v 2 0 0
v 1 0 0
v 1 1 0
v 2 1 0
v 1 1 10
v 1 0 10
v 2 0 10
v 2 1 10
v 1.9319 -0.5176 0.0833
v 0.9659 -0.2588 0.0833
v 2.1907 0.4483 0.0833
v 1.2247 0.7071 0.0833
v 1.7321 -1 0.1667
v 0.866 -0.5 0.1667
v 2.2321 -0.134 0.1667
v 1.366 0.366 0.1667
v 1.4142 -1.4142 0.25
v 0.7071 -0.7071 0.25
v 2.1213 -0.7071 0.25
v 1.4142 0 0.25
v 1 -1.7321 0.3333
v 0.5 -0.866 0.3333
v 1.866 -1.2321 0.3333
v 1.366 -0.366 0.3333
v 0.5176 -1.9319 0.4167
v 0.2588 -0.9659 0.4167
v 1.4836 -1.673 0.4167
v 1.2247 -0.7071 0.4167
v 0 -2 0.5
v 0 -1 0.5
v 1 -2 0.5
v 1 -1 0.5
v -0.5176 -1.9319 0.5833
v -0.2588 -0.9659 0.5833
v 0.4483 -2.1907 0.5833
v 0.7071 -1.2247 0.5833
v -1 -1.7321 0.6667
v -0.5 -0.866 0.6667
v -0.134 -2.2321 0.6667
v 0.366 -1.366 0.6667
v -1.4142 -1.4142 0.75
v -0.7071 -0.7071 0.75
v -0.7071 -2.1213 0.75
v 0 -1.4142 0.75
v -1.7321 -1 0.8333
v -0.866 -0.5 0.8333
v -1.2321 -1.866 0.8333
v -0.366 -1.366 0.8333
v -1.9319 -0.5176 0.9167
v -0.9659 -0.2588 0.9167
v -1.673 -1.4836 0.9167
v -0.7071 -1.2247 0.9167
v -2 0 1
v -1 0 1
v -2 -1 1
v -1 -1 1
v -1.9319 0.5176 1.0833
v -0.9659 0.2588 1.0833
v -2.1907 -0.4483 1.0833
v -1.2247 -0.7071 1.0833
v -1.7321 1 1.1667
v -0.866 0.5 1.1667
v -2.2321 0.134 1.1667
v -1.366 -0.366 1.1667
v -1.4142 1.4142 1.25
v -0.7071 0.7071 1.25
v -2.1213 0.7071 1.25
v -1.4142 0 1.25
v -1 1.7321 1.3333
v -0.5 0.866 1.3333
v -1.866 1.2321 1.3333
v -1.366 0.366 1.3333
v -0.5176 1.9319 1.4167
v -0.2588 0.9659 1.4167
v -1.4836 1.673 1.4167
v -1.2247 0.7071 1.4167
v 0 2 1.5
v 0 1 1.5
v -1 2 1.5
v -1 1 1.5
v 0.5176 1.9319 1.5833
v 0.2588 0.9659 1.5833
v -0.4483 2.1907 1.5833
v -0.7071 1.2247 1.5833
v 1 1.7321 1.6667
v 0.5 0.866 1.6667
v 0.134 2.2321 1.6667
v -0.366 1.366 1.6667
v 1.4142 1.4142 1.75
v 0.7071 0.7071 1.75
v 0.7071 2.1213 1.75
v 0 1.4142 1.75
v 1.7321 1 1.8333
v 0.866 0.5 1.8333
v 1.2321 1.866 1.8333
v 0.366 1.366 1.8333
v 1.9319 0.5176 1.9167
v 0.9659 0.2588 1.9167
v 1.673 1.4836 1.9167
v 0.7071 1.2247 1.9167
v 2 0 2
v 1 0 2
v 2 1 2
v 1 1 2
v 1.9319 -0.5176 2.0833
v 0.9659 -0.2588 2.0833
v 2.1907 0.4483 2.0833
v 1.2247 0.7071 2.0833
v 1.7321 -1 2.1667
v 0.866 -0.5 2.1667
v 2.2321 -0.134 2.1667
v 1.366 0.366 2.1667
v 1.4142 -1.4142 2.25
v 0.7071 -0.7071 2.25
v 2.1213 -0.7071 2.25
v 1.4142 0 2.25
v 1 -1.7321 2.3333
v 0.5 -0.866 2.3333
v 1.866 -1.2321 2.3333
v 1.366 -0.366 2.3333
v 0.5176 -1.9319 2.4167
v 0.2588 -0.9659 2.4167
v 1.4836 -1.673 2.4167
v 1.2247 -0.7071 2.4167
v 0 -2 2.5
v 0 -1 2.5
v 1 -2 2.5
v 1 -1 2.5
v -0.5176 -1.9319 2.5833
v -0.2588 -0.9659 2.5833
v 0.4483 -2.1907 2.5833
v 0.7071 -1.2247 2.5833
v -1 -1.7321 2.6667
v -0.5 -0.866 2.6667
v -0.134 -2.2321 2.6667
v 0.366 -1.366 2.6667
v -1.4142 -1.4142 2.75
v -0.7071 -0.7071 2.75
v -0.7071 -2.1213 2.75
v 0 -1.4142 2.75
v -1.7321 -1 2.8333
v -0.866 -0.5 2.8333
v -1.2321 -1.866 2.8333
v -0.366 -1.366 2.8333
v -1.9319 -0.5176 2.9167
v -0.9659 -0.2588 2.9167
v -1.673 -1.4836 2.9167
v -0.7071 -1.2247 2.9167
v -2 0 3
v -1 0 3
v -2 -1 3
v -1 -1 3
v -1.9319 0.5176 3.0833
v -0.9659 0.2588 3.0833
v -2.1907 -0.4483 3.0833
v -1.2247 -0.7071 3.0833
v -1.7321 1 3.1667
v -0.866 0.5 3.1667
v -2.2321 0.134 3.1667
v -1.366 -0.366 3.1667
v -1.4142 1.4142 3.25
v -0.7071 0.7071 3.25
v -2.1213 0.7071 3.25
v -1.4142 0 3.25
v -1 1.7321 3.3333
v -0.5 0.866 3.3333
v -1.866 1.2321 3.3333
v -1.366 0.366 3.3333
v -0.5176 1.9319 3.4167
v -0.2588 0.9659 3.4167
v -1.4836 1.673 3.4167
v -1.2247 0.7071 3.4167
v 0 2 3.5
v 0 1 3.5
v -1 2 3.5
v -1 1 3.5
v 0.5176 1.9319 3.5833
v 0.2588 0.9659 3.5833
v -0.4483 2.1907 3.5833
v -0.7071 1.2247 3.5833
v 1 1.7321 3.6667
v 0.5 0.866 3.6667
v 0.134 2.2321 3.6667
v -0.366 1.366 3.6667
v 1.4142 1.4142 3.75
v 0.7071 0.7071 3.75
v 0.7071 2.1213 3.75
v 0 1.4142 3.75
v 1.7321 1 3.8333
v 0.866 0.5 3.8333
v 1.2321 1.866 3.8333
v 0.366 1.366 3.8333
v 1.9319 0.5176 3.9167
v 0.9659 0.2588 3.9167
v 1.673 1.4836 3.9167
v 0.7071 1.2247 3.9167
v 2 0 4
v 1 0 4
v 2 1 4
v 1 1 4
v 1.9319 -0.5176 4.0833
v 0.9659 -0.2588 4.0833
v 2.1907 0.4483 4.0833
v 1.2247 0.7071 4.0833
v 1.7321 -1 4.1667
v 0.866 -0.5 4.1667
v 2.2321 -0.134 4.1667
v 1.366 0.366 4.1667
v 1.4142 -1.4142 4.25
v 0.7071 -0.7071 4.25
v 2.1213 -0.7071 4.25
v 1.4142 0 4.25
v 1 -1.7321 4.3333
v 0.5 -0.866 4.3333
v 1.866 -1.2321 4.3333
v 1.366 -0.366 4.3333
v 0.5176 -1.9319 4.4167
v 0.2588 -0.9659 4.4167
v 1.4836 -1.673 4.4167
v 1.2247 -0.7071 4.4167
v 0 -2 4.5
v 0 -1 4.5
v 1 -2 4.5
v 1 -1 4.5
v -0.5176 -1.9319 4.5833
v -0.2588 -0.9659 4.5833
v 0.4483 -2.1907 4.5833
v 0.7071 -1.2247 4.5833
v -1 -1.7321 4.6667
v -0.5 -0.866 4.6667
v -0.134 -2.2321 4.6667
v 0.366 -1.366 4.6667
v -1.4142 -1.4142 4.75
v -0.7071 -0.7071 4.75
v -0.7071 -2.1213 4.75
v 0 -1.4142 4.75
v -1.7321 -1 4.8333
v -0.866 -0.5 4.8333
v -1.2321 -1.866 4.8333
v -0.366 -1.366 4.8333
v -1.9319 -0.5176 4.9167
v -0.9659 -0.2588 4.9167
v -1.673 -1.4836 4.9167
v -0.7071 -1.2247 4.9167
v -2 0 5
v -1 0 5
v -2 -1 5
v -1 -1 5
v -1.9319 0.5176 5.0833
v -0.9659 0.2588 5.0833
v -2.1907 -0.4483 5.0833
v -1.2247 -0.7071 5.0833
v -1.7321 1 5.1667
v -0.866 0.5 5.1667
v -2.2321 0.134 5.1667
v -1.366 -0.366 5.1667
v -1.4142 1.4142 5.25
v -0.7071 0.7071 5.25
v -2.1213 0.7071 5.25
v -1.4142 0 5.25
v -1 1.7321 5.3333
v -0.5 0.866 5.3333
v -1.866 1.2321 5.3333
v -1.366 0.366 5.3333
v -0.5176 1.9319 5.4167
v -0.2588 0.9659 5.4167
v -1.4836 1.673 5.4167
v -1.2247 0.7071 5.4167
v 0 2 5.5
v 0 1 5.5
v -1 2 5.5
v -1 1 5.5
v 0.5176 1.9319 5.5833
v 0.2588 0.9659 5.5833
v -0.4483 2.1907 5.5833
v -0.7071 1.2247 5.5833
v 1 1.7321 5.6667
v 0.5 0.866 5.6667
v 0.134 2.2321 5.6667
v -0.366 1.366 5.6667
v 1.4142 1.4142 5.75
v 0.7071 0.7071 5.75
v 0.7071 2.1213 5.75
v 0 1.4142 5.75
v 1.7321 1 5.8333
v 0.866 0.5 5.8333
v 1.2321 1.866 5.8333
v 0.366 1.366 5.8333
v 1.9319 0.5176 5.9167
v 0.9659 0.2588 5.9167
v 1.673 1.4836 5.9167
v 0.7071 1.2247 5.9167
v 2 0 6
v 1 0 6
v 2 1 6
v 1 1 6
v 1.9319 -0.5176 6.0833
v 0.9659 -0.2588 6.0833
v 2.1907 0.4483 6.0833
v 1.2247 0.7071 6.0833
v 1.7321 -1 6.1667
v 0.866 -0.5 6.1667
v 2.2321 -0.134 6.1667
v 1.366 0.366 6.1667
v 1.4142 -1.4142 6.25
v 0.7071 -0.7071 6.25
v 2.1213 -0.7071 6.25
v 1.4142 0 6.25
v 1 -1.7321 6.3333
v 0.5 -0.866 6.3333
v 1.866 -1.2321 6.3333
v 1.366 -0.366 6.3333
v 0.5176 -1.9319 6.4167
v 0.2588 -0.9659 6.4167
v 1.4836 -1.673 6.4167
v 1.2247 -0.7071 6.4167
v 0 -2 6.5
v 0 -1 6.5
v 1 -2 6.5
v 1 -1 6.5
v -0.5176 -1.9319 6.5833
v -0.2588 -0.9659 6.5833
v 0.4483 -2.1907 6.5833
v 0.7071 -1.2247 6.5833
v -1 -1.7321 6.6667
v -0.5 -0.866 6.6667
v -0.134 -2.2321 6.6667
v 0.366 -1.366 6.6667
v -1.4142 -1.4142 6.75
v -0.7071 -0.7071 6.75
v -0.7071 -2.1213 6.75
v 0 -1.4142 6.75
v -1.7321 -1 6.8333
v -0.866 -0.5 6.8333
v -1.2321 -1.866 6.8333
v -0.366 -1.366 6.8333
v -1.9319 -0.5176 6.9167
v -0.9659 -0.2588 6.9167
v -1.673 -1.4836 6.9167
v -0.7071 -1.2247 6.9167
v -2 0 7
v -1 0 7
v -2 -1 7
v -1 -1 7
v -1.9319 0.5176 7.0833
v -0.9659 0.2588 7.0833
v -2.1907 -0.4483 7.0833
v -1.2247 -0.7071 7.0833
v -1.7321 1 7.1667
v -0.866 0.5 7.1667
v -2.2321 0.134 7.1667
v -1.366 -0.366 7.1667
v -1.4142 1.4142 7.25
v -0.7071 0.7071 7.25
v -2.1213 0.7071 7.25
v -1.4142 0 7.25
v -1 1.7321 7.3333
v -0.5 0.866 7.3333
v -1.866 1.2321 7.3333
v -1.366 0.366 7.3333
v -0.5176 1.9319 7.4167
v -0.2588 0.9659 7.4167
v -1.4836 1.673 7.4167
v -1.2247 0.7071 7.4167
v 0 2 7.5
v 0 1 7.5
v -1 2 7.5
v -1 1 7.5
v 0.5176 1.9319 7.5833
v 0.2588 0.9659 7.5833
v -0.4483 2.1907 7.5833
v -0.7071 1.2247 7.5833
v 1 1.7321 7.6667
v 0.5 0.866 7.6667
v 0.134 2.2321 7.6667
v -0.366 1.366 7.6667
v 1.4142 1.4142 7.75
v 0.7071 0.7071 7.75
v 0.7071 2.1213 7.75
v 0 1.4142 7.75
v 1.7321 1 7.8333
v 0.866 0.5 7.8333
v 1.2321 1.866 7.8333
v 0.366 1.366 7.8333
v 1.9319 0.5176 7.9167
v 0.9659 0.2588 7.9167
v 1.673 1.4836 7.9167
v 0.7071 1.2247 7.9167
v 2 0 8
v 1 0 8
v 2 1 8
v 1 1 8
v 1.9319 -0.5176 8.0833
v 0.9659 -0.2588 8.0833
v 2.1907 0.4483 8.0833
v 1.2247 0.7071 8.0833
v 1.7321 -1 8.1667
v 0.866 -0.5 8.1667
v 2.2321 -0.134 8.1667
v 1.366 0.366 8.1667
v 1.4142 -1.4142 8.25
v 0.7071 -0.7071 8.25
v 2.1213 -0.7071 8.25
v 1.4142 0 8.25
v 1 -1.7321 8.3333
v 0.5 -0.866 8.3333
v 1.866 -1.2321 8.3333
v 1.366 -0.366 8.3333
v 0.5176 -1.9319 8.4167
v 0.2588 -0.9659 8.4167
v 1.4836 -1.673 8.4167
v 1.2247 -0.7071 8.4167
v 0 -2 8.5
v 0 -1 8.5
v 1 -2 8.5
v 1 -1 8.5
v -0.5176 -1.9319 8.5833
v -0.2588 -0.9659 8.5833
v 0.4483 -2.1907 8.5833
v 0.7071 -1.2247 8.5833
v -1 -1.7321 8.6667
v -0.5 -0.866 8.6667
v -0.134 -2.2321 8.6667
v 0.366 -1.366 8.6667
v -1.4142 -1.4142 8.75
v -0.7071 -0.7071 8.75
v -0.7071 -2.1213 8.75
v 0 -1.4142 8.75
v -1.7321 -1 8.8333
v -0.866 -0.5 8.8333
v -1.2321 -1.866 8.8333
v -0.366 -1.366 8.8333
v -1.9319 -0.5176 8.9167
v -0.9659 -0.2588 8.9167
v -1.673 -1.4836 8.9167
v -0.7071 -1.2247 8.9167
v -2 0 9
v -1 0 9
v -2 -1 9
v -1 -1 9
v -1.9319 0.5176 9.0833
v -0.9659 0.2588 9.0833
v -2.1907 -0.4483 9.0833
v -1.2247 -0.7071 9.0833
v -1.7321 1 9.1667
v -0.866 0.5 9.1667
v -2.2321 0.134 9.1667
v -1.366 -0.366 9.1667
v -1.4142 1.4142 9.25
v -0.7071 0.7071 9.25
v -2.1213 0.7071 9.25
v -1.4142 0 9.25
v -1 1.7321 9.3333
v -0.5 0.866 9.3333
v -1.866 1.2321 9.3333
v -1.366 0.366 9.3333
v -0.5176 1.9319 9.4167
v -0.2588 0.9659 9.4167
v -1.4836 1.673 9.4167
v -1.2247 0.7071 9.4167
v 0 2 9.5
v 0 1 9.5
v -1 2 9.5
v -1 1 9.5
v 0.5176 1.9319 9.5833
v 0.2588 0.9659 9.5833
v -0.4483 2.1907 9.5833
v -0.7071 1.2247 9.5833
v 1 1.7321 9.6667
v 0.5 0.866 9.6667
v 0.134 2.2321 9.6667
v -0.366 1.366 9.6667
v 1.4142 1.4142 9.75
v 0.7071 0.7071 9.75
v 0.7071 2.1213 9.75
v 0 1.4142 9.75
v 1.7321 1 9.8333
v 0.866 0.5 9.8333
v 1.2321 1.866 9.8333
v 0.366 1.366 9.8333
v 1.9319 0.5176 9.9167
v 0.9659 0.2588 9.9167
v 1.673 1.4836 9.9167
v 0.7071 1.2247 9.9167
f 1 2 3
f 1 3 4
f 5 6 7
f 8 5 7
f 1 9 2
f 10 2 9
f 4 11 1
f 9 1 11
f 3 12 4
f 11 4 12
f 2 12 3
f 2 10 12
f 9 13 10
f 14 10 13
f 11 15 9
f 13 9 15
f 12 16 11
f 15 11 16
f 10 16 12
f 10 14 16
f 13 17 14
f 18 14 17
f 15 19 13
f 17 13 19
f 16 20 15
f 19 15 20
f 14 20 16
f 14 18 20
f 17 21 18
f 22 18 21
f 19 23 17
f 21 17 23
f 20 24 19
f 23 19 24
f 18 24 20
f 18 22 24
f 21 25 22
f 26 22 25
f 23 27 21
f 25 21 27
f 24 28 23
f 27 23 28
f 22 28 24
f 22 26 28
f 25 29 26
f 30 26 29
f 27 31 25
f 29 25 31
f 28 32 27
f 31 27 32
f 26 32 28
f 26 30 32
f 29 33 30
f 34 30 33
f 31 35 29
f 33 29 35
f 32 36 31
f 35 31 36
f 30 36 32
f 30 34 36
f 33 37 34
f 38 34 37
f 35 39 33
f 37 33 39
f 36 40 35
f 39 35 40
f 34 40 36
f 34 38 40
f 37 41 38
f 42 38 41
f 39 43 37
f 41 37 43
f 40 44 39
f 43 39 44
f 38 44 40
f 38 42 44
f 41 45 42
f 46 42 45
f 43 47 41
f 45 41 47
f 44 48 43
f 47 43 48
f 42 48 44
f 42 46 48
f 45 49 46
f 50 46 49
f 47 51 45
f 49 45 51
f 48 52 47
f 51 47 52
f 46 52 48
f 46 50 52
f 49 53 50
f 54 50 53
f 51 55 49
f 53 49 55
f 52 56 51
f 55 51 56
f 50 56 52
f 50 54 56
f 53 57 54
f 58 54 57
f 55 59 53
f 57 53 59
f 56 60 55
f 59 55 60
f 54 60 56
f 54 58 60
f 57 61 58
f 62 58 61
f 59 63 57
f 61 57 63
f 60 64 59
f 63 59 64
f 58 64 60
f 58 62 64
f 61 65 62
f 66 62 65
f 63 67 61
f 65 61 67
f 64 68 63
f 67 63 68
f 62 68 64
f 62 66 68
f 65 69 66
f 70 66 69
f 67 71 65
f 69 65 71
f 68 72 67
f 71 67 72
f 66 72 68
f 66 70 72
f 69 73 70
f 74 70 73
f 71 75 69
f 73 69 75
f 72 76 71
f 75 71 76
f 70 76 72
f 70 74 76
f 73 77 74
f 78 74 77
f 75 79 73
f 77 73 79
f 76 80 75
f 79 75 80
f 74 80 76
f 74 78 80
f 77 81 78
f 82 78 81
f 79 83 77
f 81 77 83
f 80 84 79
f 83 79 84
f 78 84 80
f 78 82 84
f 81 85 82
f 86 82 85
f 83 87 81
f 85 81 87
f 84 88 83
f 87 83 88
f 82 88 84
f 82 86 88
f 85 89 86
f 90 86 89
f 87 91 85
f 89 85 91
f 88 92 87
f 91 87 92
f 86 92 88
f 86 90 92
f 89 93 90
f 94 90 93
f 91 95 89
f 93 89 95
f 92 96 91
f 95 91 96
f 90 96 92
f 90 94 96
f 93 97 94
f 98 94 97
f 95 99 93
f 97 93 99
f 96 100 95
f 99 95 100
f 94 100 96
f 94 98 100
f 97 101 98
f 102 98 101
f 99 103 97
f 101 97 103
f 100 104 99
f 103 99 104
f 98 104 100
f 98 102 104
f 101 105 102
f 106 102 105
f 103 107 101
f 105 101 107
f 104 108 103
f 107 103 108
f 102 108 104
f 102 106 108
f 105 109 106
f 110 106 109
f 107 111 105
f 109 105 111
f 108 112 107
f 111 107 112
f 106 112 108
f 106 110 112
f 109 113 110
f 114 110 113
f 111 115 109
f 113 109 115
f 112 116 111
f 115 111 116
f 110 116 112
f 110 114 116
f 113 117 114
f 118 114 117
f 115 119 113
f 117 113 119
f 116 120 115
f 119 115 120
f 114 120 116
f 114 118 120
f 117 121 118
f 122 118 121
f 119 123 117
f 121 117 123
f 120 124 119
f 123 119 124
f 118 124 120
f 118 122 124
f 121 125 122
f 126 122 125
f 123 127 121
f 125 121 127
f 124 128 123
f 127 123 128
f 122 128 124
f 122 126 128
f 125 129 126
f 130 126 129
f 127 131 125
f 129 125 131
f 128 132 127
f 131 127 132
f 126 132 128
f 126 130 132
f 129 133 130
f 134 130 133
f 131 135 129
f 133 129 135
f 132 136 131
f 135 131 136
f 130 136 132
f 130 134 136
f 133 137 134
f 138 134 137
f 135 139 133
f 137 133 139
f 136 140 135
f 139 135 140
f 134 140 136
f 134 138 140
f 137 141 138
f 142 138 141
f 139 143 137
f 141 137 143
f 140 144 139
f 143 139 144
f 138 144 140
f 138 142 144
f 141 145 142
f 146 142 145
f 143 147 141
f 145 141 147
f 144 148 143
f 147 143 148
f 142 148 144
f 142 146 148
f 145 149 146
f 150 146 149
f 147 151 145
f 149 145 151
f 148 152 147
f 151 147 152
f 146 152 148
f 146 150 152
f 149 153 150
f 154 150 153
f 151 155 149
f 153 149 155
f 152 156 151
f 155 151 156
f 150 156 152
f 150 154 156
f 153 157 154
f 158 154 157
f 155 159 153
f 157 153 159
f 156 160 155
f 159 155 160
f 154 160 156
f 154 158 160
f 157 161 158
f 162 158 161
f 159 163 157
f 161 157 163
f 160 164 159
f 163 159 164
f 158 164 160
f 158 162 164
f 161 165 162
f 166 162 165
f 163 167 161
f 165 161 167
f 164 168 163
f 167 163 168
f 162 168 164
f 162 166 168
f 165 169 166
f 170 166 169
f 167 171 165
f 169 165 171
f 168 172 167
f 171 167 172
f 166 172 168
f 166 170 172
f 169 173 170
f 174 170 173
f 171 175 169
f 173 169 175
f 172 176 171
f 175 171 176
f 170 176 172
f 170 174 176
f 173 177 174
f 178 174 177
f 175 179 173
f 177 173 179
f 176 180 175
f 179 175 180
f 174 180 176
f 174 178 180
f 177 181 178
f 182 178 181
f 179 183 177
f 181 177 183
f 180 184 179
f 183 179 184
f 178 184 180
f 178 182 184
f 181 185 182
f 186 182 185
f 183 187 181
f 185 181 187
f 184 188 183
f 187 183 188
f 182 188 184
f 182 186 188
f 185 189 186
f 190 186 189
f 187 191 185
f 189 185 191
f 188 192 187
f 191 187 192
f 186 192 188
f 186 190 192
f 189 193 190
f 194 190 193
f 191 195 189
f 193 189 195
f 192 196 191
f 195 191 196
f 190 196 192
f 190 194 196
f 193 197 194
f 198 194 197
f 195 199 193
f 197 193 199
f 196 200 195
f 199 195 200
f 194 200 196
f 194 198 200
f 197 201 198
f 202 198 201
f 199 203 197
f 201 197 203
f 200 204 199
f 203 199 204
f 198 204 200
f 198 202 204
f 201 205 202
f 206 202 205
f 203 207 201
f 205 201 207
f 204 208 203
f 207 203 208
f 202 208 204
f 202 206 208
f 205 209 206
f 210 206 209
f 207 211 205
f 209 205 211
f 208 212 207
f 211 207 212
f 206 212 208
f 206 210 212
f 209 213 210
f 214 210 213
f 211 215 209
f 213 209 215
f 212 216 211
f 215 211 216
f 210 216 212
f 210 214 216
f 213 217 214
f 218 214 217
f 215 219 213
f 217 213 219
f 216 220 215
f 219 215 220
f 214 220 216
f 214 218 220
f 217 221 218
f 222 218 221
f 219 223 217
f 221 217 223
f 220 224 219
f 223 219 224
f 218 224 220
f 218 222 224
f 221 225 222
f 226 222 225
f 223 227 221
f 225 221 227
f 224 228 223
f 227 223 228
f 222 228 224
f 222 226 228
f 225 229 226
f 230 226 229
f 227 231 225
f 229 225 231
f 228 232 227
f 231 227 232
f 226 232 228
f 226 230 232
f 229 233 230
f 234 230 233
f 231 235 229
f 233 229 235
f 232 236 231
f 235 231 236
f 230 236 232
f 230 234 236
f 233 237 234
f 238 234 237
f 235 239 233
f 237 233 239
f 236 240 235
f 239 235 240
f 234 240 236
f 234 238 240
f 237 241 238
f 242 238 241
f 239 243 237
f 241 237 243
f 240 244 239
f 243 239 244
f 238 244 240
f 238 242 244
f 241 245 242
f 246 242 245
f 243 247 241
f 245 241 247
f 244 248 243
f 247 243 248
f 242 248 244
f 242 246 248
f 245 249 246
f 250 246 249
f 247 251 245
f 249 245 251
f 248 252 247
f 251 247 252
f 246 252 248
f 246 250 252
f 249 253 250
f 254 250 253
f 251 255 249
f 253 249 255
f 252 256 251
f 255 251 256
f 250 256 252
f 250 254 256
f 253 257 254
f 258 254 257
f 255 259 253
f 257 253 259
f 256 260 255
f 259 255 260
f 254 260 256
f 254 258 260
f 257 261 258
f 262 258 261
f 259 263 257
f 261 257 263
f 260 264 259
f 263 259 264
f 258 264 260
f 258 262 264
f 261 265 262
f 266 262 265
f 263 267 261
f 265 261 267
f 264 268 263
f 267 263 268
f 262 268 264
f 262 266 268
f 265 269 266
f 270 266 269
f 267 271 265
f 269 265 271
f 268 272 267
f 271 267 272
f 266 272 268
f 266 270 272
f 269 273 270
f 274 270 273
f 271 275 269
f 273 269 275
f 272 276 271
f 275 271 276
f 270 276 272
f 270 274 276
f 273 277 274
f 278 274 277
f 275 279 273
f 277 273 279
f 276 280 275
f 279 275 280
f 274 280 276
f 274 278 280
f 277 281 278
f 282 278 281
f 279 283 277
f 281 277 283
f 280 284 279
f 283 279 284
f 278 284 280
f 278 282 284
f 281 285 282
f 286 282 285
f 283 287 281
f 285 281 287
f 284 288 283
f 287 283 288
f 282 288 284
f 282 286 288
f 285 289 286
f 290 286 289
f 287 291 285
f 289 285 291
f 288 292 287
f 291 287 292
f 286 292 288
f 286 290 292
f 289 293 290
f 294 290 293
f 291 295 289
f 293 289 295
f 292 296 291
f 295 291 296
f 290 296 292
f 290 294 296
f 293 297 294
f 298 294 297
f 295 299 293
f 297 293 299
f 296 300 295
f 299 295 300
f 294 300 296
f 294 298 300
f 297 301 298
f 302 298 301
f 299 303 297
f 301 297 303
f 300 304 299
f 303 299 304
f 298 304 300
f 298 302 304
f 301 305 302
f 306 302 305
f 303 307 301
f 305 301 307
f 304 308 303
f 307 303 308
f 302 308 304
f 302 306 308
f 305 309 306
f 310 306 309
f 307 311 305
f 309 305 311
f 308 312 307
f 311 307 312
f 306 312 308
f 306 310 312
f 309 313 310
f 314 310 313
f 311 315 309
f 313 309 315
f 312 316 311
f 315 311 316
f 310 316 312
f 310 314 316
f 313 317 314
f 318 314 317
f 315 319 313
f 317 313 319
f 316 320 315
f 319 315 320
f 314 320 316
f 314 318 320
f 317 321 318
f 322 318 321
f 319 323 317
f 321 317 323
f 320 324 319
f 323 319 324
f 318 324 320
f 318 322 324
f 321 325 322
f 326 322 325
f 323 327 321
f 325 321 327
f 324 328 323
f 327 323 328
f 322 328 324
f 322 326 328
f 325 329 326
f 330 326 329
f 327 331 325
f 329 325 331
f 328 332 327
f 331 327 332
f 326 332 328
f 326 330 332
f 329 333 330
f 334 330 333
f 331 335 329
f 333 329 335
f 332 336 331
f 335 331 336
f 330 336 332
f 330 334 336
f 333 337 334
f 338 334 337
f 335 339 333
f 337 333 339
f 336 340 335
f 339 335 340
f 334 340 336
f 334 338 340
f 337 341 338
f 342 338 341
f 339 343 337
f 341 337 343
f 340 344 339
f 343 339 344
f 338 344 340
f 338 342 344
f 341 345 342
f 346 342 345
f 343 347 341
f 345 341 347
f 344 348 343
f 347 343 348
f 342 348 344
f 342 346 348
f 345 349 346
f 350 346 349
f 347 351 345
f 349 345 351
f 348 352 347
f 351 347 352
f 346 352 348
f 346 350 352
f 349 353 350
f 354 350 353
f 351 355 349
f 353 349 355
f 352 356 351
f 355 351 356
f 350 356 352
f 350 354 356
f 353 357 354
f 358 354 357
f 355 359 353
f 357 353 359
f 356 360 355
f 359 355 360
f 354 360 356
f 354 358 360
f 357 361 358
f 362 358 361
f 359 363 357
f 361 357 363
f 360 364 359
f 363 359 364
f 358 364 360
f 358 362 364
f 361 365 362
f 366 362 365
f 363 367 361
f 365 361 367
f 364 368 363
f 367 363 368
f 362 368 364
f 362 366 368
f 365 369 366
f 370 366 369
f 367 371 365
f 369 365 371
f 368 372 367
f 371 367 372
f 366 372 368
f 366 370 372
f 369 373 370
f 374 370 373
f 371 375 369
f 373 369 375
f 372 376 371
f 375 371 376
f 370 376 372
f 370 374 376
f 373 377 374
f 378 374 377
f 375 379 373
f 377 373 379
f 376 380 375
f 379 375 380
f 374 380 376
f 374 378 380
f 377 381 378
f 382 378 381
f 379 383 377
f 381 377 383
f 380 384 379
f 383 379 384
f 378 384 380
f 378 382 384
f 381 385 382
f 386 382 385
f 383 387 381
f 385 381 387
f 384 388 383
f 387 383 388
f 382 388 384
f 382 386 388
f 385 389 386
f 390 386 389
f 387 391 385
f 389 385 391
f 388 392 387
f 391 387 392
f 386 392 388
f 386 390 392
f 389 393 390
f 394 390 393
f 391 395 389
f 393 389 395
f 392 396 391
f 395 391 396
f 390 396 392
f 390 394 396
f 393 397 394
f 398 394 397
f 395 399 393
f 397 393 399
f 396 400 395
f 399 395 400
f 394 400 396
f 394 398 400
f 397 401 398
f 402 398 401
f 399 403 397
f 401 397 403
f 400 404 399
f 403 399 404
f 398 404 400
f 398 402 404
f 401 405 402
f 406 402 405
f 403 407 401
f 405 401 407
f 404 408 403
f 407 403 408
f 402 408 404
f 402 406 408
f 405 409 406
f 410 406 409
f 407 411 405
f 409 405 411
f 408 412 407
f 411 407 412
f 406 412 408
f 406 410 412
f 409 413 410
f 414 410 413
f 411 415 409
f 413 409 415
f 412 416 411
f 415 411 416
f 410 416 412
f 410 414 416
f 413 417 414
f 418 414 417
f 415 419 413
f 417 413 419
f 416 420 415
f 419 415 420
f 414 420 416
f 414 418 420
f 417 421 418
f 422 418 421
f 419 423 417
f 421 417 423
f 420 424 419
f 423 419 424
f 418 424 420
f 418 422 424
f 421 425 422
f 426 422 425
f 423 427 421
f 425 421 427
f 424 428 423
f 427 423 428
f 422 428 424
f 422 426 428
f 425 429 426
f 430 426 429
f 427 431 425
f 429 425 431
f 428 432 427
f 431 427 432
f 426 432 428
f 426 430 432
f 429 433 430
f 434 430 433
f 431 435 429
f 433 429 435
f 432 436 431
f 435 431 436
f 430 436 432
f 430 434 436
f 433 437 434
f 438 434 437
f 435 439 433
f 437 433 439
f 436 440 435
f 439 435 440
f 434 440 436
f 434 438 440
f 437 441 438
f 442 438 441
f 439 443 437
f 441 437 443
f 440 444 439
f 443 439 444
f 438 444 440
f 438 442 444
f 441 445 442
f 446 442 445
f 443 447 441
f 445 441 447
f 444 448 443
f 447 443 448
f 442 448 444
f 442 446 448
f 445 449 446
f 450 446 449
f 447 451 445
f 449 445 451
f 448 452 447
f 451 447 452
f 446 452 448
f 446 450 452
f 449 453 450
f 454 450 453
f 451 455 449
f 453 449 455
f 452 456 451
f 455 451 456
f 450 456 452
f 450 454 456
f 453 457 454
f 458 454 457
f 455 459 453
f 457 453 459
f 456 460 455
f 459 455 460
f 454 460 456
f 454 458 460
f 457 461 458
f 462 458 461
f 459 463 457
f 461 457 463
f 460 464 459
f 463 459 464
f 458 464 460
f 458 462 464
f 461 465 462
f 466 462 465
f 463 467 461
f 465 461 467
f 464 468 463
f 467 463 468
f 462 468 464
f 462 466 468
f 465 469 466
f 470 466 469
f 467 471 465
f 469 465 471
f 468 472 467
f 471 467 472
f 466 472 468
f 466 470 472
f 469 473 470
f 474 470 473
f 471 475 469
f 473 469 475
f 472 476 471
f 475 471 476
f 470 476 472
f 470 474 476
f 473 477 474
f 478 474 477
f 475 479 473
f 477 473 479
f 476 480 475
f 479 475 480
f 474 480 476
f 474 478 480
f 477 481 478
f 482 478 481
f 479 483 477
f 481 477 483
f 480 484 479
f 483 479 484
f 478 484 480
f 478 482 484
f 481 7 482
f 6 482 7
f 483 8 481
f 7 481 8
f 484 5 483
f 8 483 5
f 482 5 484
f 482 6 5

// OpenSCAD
//------------------------------------------------------------------------------------------
// THIS CODE WAS GENERATED WITH GRAPHSCAD
//------------------------------------------------------------------------------------------
// Graphscad is a graphical nodal editor to create .SCAD files
//
// More info : http://graphscad.free.fr
//
// Scad Files created with Graphscad can be edited by graphscad
// Scad Files created with Graphscad can be read by Openscad
//
//------------------------------------------------------------------------------------------
module linearextrude()
{
 function node_square_matrix(i=0,j=0,k=0,l=0,m=0,n=0) = translate([1,0,0]);
 module node_square(i=0,j=0,k=0,l=0,m=0,n=0)
 {
  translate([1,0,0])square(size=[1,1],center=false);
 }
 function node_linearextrude_matrix(i=0,j=0,k=0,l=0,m=0,n=0) = translate([0,0,0]);
 module node_linearextrude(i=0,j=0,k=0,l=0,m=0,n=0)
 {
  linear_extrude(height=10,center=false,convexity=1,twist=360*5,slices=120,scale=1)
  {
   node_square(i,j,k,l,m,n);
  }
 }
 node_linearextrude();
 /*--------------------------------------------------------------------------------------------------------
  Graphscad Utils functions
  This code is Used By Graphscad Nodal Editor to generate SCAD files
 --------------------------------------------------------------------------------------------------------*/
 function det4x4(a) =
 a[0][0]*a[1][1]*a[2][2]*a[3][3] + a[0][0]*a[1][2]*a[2][3]*a[3][1] + a[0][0]*a[1][3]*a[2][1]*a[3][2]
 + a[0][1]*a[1][0]*a[2][3]*a[3][2] + a[0][1]*a[1][2]*a[2][0]*a[3][3] + a[0][1]*a[1][3]*a[2][2]*a[3][0]
 + a[0][2]*a[1][0]*a[2][1]*a[3][3] + a[0][2]*a[1][1]*a[2][3]*a[3][0] + a[0][2]*a[1][3]*a[2][0]*a[3][1]
 + a[0][3]*a[1][0]*a[2][2]*a[3][1] + a[0][3]*a[1][1]*a[2][0]*a[3][2] + a[0][3]*a[1][2]*a[2][1]*a[3][0]
 - a[0][0]*a[1][1]*a[2][3]*a[3][2] - a[0][0]*a[1][2]*a[2][1]*a[3][3] - a[0][0]*a[1][3]*a[2][2]*a[3][1]
 - a[0][1]*a[1][0]*a[2][2]*a[3][3] - a[0][1]*a[1][2]*a[2][3]*a[3][0] - a[0][1]*a[1][3]*a[2][0]*a[3][2]
 - a[0][2]*a[1][0]*a[2][3]*a[3][1] - a[0][2]*a[1][1]*a[2][0]*a[3][3] - a[0][2]*a[1][3]*a[2][1]*a[3][0]
 - a[0][3]*a[1][0]*a[2][1]*a[3][2] - a[0][3]*a[1][1]*a[2][2]*a[3][0] - a[0][3]*a[1][2]*a[2][0]*a[3][1];
 function invb00(a) = a[1][1]*a[2][2]*a[3][3] + a[1][2]*a[2][3]*a[3][1] + a[1][3]*a[2][1]*a[3][2] - a[1][1]*a[2][3]*a[3][2] - a[1][2]*a[2][1]*a[3][3] - a[1][3]*a[2][2]*a[3][1];
 function invb01(a) = a[0][1]*a[2][3]*a[3][2] + a[0][2]*a[2][1]*a[3][3] + a[0][3]*a[2][2]*a[3][1] - a[0][1]*a[2][2]*a[3][3] - a[0][2]*a[2][3]*a[3][1] - a[0][3]*a[2][1]*a[3][2];
 function invb02(a) = a[0][1]*a[1][2]*a[3][3] + a[0][2]*a[1][3]*a[3][1] + a[0][3]*a[1][1]*a[3][2] - a[0][1]*a[1][3]*a[3][2] - a[0][2]*a[1][1]*a[3][3] - a[0][3]*a[1][2]*a[3][1];
 function invb03(a) = a[0][1]*a[1][3]*a[2][2] + a[0][2]*a[1][1]*a[2][3] + a[0][3]*a[1][2]*a[2][1] - a[0][1]*a[1][2]*a[2][3] - a[0][2]*a[1][3]*a[2][1] - a[0][3]*a[1][1]*a[2][2];
 function invb10(a) = a[1][0]*a[2][3]*a[3][2] + a[1][2]*a[2][0]*a[3][3] + a[1][3]*a[2][2]*a[3][0] - a[1][0]*a[2][2]*a[3][3] - a[1][2]*a[2][3]*a[3][0] - a[1][3]*a[2][0]*a[3][2];
 function invb11(a) = a[0][0]*a[2][2]*a[3][3] + a[0][2]*a[2][3]*a[3][0] + a[0][3]*a[2][0]*a[3][2] - a[0][0]*a[2][3]*a[3][2] - a[0][2]*a[2][0]*a[3][3] - a[0][3]*a[2][2]*a[3][0];
 function invb12(a) = a[0][0]*a[1][3]*a[3][2] + a[0][2]*a[1][0]*a[3][3] + a[0][3]*a[1][2]*a[3][0] - a[0][0]*a[1][2]*a[3][3] - a[0][2]*a[1][3]*a[3][0] - a[0][3]*a[1][0]*a[3][2];
 function invb13(a) = a[0][0]*a[1][2]*a[2][3] + a[0][2]*a[1][3]*a[2][0] + a[0][3]*a[1][0]*a[2][2] - a[0][0]*a[1][3]*a[2][2] - a[0][2]*a[1][0]*a[2][3] - a[0][3]*a[1][2]*a[2][0];
 function invb20(a) = a[1][0]*a[2][1]*a[3][3] + a[1][1]*a[2][3]*a[3][0] + a[1][3]*a[2][0]*a[3][1] - a[1][0]*a[2][3]*a[3][1] - a[1][1]*a[2][0]*a[3][3] - a[1][3]*a[2][1]*a[3][0];
 function invb21(a) = a[0][0]*a[2][3]*a[3][1] + a[0][1]*a[2][0]*a[3][3] + a[0][3]*a[2][1]*a[3][0] - a[0][0]*a[2][1]*a[3][3] - a[0][1]*a[2][3]*a[3][0] - a[0][3]*a[2][0]*a[3][1];
 function invb22(a) = a[0][0]*a[1][1]*a[3][3] + a[0][1]*a[1][3]*a[3][0] + a[0][3]*a[1][0]*a[3][1] - a[0][0]*a[1][3]*a[3][1] - a[0][1]*a[1][0]*a[3][3] - a[0][3]*a[1][1]*a[3][0];
 function invb23(a) = a[0][0]*a[1][3]*a[2][1] + a[0][1]*a[1][0]*a[2][3] + a[0][3]*a[1][1]*a[2][0] - a[0][0]*a[1][1]*a[2][3] - a[0][1]*a[1][3]*a[2][0] - a[0][3]*a[1][0]*a[2][1];
 function invb30(a) = a[1][0]*a[2][2]*a[3][1] + a[1][1]*a[2][0]*a[3][2] + a[1][2]*a[2][1]*a[3][0] - a[1][0]*a[2][1]*a[3][2] - a[1][1]*a[2][2]*a[3][0] - a[1][2]*a[2][0]*a[3][1];
 function invb31(a) = a[0][0]*a[2][1]*a[3][2] + a[0][1]*a[2][2]*a[3][0] + a[0][2]*a[2][0]*a[3][1] - a[0][0]*a[2][2]*a[3][1] - a[0][1]*a[2][0]*a[3][2] - a[0][2]*a[2][1]*a[3][0];
 function invb32(a) = a[0][0]*a[1][2]*a[3][1] + a[0][1]*a[1][0]*a[3][2] + a[0][2]*a[1][1]*a[3][0] - a[0][0]*a[1][1]*a[3][2] - a[0][1]*a[1][2]*a[3][0] - a[0][2]*a[1][0]*a[3][1];
 function invb33(a) = a[0][0]*a[1][1]*a[2][2] + a[0][1]*a[1][2]*a[2][0] + a[0][2]*a[1][0]*a[2][1] - a[0][0]*a[1][2]*a[2][1] - a[0][1]*a[1][0]*a[2][2] - a[0][2]*a[1][1]*a[2][0];
 function inv4x4(a)= (1/det4x4(a))*[
 [invb00(a),invb01(a),invb02(a),invb03(a)],
 [invb10(a),invb11(a),invb12(a),invb13(a)],
 [invb20(a),invb21(a),invb22(a),invb23(a)],
 [invb30(a),invb31(a),invb32(a),invb33(a)]];
 function onlytranslate(a)=  [
                        [1,0,0,a[0][3]],
                        [0,1,0,a[1][3]],
                        [0,0,1,a[2][3]],
                        [0,0,0,1]];
 function negonlytranslate(a)=[
                        [1,0,0,-a[0][3]],
                        [0,1,0,-a[1][3]],
                        [0,0,1,-a[2][3]],
                        [0,0,0,1]];
 function lookatvec(t,parentmat) = [t[0]-parentmat[0][3],
                                 t[1]-parentmat[1][3],
                                 t[2]-parentmat[2][3]];
 /*
              rx = '0'
              ry = 'acos('+tz+'/norm(['+tx+','+ty+','+tz+']))'
              rz = 'atan2('+ty+','+tx+')'
 */
 function lookatrot(t,parentmat) = [0,
                                 acos((t[2]-parentmat[2][3])/norm(lookatvec(t,parentmat))),
                                 atan2(t[1]-parentmat[1][3],t[0]-parentmat[0][3])];
 function gettranslation(m) = [m[0][3],m[1][3],m[2][3]];
 function vectormulmatrix(v,m) = m*v;
 function vectorlength(v) = norm(v);
 function vectorx(v) = v[0];
 function vectory(v) = v[1];
 function vectorz(v) = v[2];
 function vectoradd(a,b) = (a+b);
 function vectorsub(a,b) = (a-b);
 function vectormul(a,b) = (a*b);
 function vectordiv(a,b) = (a*(1/b));
 function scale(v)=[[v[0],0,0,0],
                    [0,v[1],0,0],
                    [0,0,v[2],0],
                    [0,0,0,1]];
 function rotatex(a)=[[1,0,0,0],
                      [0,cos(a),-sin(a),0],
                      [0,sin(a),cos(a),0],
                      [0,0,0,1]];
 function rotatey(a)=[[cos(a),0,sin(a),0],
                      [0,1,0,0],
                      [-sin(a),0,cos(a),0],
                      [0,0,0,1]];
 function rotatez(a)=[[cos(a),-sin(a),0,0],
                      [sin(a),cos(a),0,0],
                      [0,0,1,0],
                      [0,0,0,1]];
 function rotatea(c,s,l,m,n)=[[l*l*(1-c)+c,m*l*(1-c)-n*s,n*l*(1-c)+m*s,0],
                              [l*m*(1-c)+n*s,m*m*(1-c)+c,n*m*(1-c)-l*s,0],
                              [l*n*(1-c)-m*s,m*n*(1-c)+l*s,n*n*(1-c)+c,0],
                              [0,0,0,1]];
 function rotateanv(a,nv)=rotatea(cos(a),sin(a),nv[0],nv[1],nv[2]);
 function rotate(a,v, normV=true)=(v==undef)?rotatez(a[2])*rotatey(a[1])*rotatex(a[0]):
                      normV ? rotateanv(a,v/sqrt(v*v)) : rotateanv(a,v);
 function translate(v)=[[1,0,0,v[0]],
                        [0,1,0,v[1]],
                        [0,0,1,v[2]],
                        [0,0,0,1]];
 function mirrorabc(a,b,c)=[[1-2*a*a,-2*a*b,-2*a*c,0],
                            [-2*a*b,1-2*b*b,-2*b*c,0],
                            [-2*a*c,-2*b*c,1-2*c*c,0],
                            [0,0,0,1]];
 function mirrornv(nv)=mirrorabc(nv[0],nv[1],nv[2]);
 function mirror(v)=mirrornv(v/sqrt(v*v));
}
linearextrude();


/*BEGINGRAPHSCAD{
    "nodes": [
        {
            "name": "node_square",
            "inputplugs": [
                {
                    "type": "str",
                    "name": "x",
                    "value": "1"
                },
                {
                    "type": "str",
                    "name": "y",
                    "value": "1"
                },
                {
                    "type": "str",
                    "name": "tx",
                    "value": "1"
                },
                {
                    "type": "str",
                    "name": "ty",
                    "value": "0"
                },
                {
                    "type": "str",
                    "name": "tz",
                    "value": "0"
                },
                {
                    "type": "str",
                    "name": "center",
                    "value": "false",
                    "combo": [
                        "true",
                        "false"
                    ]
                }
            ],
            "typename": "Node_square",
            "version": 1,
            "y": 71.18358779014685,
            "x": -4325.341933308979
        },
        {
            "name": "node_linearextrude",
            "inputplugs": [
                {
                    "connection": "node_square.object2d",
                    "type": "object2d",
                    "name": "object2d",
                    "value": ""
                },
                {
                    "type": "str",
                    "name": "height",
                    "value": "10"
                },
                {
                    "type": "str",
                    "name": "center",
                    "value": "false",
                    "combo": [
                        "true",
                        "false"
                    ]
                },
                {
                    "type": "str",
                    "name": "convexity",
                    "value": "1"
                },
                {
                    "type": "str",
                    "name": "twist",
                    "value": "360*5"
                },
                {
                    "type": "str",
                    "name": "slices",
                    "value": "120"
                },
                {
                    "type": "str",
                    "name": "scale",
                    "value": "1"
                }
            ],
            "typename": "Node_linearextrude",
            "version": 1,
            "y": 66.54910503152604,
            "x": -4093.7545270121277
        },
        {
            "name": "node_comment",
            "inputplugs": [
                {
                    "type": "str",
                    "name": "comment",
                    "value": "linear extrude test"
                }
            ],
            "typename": "Node_comment",
            "version": 1,
            "y": 20.031563802140738,
            "x": -4295.944631959654
        }
    ],
    "version": 2
}ENDGRAPHSCAD*/
